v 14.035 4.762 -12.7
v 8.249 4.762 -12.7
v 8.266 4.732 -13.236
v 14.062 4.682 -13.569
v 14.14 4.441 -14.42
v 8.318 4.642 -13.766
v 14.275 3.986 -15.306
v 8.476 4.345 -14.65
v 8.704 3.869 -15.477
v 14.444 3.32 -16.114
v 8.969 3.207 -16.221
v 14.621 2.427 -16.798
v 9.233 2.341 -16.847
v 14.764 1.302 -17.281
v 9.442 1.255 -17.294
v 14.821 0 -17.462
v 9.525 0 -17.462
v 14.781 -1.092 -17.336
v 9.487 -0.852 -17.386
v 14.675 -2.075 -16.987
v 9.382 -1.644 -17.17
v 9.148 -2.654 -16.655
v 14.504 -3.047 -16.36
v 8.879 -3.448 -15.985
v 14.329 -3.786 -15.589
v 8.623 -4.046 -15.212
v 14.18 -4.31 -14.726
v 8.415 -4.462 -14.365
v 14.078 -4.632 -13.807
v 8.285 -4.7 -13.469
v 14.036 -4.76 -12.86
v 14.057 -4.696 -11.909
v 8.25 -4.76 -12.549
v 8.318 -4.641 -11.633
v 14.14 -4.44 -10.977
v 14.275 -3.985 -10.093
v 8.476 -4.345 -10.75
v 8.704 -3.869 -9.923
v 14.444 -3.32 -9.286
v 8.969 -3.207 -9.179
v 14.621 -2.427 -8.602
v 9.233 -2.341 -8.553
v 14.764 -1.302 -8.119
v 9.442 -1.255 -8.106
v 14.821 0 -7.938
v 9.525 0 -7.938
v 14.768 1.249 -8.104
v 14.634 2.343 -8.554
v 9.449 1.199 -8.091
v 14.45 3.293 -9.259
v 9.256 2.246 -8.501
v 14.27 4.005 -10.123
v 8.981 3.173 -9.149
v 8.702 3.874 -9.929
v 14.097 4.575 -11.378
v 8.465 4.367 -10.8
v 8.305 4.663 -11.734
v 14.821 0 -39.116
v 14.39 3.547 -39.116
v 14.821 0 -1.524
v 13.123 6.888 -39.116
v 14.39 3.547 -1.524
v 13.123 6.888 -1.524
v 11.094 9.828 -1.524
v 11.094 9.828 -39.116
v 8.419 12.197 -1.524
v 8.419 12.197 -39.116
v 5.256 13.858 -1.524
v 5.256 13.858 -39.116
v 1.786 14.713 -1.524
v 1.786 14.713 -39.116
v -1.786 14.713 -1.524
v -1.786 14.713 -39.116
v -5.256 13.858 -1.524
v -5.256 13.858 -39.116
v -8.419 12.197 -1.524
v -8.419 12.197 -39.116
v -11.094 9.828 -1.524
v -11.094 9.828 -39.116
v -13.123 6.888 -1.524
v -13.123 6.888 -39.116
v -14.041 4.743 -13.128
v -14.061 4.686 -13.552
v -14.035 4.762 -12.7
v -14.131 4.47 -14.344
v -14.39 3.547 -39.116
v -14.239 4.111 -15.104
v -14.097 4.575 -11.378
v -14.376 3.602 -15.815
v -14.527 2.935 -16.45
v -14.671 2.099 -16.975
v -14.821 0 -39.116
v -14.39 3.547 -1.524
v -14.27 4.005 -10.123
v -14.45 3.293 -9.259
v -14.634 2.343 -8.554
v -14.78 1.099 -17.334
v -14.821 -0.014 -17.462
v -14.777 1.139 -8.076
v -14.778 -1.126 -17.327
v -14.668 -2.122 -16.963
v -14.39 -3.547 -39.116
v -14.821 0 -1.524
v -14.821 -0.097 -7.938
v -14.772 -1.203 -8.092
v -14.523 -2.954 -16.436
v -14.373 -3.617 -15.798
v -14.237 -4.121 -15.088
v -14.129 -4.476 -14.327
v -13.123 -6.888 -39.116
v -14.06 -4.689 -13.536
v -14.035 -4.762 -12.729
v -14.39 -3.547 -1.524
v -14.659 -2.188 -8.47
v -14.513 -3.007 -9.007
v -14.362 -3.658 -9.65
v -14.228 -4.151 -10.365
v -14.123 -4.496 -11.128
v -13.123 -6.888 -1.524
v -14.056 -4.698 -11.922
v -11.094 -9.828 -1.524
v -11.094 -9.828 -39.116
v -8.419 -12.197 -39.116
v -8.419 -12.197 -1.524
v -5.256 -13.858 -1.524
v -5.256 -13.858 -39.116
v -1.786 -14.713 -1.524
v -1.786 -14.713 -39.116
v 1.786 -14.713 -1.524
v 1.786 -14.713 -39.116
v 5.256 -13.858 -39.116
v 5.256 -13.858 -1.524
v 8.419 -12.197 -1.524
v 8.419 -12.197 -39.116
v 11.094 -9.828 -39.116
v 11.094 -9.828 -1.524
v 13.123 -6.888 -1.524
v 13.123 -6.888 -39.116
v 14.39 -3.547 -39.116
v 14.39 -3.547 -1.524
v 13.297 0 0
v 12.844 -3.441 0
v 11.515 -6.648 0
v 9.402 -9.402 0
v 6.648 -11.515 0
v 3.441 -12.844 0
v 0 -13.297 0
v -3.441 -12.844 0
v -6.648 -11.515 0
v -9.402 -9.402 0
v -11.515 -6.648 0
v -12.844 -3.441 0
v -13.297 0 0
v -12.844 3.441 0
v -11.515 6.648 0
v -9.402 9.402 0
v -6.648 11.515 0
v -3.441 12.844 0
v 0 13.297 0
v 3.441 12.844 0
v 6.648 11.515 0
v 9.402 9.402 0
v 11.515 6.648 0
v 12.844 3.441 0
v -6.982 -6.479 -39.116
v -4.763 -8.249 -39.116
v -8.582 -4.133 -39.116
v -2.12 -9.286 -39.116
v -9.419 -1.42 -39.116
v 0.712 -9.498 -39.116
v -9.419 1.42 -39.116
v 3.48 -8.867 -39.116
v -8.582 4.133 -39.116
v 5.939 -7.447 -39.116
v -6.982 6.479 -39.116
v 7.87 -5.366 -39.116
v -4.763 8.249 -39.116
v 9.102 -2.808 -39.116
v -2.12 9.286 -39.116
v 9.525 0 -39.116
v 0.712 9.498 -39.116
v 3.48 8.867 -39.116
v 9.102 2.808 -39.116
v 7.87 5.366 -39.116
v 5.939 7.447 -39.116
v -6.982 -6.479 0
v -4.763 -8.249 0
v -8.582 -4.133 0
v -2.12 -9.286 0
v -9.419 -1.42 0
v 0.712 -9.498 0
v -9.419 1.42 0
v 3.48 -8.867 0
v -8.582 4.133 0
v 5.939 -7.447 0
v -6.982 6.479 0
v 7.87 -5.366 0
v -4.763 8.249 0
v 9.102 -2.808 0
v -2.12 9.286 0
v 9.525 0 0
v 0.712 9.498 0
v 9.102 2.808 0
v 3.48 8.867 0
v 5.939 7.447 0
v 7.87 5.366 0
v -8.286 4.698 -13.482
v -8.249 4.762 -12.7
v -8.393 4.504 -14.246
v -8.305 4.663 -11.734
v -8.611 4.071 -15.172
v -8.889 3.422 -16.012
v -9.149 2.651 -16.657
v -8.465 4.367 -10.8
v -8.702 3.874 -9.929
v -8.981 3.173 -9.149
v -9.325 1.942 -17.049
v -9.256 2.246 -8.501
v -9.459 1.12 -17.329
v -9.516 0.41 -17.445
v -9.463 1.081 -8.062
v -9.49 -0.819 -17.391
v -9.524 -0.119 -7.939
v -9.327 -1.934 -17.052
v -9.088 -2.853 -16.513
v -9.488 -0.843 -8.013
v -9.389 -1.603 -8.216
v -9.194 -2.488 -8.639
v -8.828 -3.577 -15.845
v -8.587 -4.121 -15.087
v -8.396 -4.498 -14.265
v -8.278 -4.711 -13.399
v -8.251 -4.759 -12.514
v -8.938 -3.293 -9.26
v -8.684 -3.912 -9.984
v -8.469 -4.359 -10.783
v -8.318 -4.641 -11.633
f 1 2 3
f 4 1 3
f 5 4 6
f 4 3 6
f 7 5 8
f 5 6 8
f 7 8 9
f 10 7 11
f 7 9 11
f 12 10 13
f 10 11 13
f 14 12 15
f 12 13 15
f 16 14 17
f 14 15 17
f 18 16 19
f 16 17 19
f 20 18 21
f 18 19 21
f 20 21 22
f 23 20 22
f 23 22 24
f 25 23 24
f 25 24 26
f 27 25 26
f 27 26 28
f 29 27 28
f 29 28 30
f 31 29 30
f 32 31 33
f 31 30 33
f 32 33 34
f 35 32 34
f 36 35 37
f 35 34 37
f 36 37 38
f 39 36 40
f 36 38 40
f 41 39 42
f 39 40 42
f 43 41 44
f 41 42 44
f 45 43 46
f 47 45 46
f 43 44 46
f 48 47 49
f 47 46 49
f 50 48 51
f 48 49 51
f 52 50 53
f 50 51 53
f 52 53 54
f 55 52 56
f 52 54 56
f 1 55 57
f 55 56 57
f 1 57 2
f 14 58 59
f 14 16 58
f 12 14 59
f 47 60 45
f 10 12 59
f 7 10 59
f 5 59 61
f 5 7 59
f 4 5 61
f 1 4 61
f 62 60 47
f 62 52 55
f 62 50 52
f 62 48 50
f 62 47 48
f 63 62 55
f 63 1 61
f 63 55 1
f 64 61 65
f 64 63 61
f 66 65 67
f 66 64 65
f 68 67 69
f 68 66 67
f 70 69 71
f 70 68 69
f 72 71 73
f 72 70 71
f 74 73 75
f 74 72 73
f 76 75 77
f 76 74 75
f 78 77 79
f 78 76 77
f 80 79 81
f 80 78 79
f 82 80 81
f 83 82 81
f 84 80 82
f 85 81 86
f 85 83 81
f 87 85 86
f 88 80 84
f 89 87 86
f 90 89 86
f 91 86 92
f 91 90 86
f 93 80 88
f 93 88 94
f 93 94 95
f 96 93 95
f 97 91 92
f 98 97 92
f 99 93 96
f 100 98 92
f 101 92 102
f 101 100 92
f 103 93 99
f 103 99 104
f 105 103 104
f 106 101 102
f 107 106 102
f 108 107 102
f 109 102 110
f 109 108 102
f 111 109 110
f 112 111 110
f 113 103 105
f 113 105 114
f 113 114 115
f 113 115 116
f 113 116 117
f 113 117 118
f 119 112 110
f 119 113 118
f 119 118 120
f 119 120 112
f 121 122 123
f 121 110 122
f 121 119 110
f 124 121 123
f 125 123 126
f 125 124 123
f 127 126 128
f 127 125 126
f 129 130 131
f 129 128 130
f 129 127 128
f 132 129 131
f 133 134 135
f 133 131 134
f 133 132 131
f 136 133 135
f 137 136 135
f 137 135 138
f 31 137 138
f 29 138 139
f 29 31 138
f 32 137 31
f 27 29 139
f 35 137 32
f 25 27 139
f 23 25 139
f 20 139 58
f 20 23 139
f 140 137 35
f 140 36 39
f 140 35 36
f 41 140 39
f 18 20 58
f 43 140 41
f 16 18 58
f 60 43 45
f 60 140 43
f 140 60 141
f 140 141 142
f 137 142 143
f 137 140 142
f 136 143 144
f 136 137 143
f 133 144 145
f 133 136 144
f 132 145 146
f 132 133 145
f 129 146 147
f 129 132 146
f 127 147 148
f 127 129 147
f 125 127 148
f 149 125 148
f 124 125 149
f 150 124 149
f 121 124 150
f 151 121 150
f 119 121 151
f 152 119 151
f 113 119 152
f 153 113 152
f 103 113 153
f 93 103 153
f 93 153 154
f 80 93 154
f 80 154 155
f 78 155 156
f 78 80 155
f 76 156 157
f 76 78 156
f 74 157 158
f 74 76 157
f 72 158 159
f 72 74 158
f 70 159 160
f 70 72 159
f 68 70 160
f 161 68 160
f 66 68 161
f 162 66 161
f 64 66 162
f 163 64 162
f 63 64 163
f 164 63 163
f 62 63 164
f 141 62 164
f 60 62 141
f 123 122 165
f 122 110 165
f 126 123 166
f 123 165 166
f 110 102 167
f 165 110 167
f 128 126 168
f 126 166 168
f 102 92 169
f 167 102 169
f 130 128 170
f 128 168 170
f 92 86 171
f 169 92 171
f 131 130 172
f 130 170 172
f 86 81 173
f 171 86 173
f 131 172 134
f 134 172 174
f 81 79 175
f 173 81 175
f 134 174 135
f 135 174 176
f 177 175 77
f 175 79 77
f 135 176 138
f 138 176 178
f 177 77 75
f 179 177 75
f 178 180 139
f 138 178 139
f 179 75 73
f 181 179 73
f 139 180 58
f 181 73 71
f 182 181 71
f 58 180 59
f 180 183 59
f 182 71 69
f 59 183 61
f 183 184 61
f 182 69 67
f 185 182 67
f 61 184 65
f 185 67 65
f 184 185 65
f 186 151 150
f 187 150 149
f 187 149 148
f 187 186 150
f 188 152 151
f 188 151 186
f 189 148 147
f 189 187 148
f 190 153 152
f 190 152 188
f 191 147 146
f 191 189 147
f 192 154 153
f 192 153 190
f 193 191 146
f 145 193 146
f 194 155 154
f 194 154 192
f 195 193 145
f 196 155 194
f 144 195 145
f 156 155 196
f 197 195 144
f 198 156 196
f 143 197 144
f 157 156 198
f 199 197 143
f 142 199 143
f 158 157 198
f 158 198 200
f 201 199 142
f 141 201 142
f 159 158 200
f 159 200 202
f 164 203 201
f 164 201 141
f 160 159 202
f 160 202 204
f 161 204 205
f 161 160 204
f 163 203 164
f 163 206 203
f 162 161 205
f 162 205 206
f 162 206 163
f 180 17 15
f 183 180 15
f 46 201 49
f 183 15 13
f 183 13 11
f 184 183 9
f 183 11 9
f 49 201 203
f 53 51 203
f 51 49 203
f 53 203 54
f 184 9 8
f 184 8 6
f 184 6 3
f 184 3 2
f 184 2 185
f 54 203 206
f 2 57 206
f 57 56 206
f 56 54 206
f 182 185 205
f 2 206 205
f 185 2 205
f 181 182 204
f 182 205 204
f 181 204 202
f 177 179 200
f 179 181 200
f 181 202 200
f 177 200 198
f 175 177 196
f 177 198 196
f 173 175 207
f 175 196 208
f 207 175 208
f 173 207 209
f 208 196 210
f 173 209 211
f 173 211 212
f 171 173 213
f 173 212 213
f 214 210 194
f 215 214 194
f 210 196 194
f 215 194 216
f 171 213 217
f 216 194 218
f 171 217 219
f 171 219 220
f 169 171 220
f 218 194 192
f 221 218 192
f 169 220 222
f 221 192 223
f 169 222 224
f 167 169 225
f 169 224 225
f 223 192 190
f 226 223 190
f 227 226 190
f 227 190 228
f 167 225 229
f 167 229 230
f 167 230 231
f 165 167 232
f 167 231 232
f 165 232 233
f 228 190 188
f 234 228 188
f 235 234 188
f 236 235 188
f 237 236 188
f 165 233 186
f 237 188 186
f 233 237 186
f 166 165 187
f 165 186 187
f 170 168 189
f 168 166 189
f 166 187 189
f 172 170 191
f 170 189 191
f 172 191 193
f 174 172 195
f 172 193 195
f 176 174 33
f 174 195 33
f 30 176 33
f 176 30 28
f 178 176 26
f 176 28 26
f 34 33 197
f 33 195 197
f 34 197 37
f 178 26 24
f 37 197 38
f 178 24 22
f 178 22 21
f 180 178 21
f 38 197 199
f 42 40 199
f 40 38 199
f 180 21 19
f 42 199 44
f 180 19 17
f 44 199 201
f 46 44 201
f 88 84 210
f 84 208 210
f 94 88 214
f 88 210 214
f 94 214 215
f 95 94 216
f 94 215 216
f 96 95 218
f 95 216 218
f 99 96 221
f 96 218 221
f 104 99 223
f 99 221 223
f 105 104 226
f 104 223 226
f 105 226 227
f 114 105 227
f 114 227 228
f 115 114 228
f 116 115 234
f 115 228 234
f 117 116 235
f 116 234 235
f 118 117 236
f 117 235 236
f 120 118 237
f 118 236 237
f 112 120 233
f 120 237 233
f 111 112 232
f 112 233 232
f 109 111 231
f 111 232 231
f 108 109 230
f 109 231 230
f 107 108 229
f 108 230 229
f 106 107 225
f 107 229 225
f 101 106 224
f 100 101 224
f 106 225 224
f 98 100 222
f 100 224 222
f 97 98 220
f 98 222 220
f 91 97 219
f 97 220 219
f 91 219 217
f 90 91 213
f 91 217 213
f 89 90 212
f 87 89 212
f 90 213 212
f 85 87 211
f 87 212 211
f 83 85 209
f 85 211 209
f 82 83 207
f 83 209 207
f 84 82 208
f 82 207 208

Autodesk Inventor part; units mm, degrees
ref_plane "YZ Plane" through (0, 0, 0) normal (1, 0, 0) x (0, 1, 0)
ref_plane "XZ Plane" through (0, 0, 0) normal (0, 1, 0) x (-1, 0, 0)
ref_plane "XY Plane" through (0, 0, 0) normal (0, 0, 1) x (1, 0, 0)
sketch "Sketch1" plane through (0, 0, 0) normal (0, 0, 1) x (1, 0, 0)
  line L0 (-20.7493, 0) -> (20.7493, 0) projected
  line L1 (0, -20.7493) -> (0, 20.7493) projected
  circle A0 centre (0, 0) radius 14.8209
  circle A1 centre (0, 0) radius 9.525
  dimension "d2" = 29.6418
  dimension "d3" = 19.05
extrude "Extrusion1" add sketch "Sketch1" against normal blind 39.116 contours A1 L1 A0 L0 | L0 A0 L1 A1 | A1 L0 A0 L1 | L1 A0 L0 A1
chamfer "Chamfer1" distance 1.524 angle 45 1 edges at (-14.8209, 0, 0) measured on face at (14.7728, -1.1926, -26.0773)
sketch "Sketch2" plane through (0, 0, 0) normal (1, 0, 0) x (0, 1, 0)
  line L0 (-14.8209, -39.116) -> (14.8209, -39.116) projected
  line L1 (14.8209, -1.524) -> (14.8209, -39.116) projected
  circle A0 centre (0, -12.7) radius 4.7625
  point P0 (0, 0)
  dimension "d9" = 26.416
  dimension "d10" = 9.525
extrude "Extrusion2" cut sketch "Sketch2" along normal through all both and the other way through all
properties part number "Ch7(5) Part 5 Sleeve"
